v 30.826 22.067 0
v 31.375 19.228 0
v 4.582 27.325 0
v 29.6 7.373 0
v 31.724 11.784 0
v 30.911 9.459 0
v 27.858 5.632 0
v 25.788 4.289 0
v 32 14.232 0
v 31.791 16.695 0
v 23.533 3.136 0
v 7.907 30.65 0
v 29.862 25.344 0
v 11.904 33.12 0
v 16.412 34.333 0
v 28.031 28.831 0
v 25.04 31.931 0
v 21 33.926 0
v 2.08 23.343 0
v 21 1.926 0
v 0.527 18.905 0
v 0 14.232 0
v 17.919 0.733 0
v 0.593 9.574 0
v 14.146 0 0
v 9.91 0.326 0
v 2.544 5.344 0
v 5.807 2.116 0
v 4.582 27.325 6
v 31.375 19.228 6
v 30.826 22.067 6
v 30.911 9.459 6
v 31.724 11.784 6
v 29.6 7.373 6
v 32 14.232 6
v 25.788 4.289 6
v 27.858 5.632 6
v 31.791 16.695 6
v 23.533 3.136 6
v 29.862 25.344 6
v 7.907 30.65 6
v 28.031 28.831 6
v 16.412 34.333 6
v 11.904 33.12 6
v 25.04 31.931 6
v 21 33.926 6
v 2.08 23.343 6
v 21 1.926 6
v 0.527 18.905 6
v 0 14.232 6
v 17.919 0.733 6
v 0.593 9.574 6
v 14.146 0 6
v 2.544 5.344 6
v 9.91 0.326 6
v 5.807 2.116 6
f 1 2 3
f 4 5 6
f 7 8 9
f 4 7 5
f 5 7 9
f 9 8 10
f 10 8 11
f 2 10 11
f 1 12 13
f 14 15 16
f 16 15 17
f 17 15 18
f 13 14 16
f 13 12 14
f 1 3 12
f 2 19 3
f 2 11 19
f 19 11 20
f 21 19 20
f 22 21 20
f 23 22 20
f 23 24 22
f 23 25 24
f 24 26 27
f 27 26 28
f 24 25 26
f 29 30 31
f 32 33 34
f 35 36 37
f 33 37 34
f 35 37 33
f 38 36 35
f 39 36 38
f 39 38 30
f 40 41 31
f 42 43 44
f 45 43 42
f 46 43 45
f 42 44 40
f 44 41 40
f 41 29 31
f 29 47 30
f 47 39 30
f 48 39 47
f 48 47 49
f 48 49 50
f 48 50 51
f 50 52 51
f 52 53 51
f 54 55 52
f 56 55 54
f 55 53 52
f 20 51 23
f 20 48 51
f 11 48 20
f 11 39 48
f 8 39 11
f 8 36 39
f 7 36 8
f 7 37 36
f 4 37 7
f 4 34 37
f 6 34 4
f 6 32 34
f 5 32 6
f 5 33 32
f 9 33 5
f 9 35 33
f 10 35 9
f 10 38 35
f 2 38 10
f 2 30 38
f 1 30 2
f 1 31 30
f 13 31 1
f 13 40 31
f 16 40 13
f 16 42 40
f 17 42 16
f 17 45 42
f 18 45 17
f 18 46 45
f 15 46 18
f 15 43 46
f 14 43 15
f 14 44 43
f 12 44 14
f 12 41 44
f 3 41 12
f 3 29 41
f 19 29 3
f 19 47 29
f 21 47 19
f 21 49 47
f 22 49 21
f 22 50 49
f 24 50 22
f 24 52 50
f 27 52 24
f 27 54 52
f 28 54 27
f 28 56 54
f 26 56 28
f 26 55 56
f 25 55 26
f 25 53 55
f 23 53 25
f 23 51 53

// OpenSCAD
$fn = 32;

// ----------------------------------------------------------------------
// Cam disc: base radius 11.0 mm, lift 10.0 mm, 28 profile points
// ----------------------------------------------------------------------

// --- parameters (mm) ---
profile_height = 6;       // extrusion height
profile_points = 28;      // points of the closed outline

profile = [[32, 14.232], [31.791, 16.695], [31.375, 19.228], [30.826, 22.067], [29.862, 25.344], [28.031, 28.831], [25.04, 31.931], [21, 33.926], [16.412, 34.333], [11.904, 33.12], [7.907, 30.65], [4.582, 27.325], [2.08, 23.343], [0.527, 18.905], [0, 14.232], [0.593, 9.574], [2.544, 5.344], [5.807, 2.116], [9.91, 0.326], [14.146, 0], [17.919, 0.733], [21, 1.926], [23.533, 3.136], [25.788, 4.289], [27.858, 5.632], [29.6, 7.373], [30.911, 9.459], [31.724, 11.784]];  // single closed polygon, 28 points, counter clockwise

// --- the one profile operation ---
linear_extrude(height = profile_height) polygon(points = profile);
